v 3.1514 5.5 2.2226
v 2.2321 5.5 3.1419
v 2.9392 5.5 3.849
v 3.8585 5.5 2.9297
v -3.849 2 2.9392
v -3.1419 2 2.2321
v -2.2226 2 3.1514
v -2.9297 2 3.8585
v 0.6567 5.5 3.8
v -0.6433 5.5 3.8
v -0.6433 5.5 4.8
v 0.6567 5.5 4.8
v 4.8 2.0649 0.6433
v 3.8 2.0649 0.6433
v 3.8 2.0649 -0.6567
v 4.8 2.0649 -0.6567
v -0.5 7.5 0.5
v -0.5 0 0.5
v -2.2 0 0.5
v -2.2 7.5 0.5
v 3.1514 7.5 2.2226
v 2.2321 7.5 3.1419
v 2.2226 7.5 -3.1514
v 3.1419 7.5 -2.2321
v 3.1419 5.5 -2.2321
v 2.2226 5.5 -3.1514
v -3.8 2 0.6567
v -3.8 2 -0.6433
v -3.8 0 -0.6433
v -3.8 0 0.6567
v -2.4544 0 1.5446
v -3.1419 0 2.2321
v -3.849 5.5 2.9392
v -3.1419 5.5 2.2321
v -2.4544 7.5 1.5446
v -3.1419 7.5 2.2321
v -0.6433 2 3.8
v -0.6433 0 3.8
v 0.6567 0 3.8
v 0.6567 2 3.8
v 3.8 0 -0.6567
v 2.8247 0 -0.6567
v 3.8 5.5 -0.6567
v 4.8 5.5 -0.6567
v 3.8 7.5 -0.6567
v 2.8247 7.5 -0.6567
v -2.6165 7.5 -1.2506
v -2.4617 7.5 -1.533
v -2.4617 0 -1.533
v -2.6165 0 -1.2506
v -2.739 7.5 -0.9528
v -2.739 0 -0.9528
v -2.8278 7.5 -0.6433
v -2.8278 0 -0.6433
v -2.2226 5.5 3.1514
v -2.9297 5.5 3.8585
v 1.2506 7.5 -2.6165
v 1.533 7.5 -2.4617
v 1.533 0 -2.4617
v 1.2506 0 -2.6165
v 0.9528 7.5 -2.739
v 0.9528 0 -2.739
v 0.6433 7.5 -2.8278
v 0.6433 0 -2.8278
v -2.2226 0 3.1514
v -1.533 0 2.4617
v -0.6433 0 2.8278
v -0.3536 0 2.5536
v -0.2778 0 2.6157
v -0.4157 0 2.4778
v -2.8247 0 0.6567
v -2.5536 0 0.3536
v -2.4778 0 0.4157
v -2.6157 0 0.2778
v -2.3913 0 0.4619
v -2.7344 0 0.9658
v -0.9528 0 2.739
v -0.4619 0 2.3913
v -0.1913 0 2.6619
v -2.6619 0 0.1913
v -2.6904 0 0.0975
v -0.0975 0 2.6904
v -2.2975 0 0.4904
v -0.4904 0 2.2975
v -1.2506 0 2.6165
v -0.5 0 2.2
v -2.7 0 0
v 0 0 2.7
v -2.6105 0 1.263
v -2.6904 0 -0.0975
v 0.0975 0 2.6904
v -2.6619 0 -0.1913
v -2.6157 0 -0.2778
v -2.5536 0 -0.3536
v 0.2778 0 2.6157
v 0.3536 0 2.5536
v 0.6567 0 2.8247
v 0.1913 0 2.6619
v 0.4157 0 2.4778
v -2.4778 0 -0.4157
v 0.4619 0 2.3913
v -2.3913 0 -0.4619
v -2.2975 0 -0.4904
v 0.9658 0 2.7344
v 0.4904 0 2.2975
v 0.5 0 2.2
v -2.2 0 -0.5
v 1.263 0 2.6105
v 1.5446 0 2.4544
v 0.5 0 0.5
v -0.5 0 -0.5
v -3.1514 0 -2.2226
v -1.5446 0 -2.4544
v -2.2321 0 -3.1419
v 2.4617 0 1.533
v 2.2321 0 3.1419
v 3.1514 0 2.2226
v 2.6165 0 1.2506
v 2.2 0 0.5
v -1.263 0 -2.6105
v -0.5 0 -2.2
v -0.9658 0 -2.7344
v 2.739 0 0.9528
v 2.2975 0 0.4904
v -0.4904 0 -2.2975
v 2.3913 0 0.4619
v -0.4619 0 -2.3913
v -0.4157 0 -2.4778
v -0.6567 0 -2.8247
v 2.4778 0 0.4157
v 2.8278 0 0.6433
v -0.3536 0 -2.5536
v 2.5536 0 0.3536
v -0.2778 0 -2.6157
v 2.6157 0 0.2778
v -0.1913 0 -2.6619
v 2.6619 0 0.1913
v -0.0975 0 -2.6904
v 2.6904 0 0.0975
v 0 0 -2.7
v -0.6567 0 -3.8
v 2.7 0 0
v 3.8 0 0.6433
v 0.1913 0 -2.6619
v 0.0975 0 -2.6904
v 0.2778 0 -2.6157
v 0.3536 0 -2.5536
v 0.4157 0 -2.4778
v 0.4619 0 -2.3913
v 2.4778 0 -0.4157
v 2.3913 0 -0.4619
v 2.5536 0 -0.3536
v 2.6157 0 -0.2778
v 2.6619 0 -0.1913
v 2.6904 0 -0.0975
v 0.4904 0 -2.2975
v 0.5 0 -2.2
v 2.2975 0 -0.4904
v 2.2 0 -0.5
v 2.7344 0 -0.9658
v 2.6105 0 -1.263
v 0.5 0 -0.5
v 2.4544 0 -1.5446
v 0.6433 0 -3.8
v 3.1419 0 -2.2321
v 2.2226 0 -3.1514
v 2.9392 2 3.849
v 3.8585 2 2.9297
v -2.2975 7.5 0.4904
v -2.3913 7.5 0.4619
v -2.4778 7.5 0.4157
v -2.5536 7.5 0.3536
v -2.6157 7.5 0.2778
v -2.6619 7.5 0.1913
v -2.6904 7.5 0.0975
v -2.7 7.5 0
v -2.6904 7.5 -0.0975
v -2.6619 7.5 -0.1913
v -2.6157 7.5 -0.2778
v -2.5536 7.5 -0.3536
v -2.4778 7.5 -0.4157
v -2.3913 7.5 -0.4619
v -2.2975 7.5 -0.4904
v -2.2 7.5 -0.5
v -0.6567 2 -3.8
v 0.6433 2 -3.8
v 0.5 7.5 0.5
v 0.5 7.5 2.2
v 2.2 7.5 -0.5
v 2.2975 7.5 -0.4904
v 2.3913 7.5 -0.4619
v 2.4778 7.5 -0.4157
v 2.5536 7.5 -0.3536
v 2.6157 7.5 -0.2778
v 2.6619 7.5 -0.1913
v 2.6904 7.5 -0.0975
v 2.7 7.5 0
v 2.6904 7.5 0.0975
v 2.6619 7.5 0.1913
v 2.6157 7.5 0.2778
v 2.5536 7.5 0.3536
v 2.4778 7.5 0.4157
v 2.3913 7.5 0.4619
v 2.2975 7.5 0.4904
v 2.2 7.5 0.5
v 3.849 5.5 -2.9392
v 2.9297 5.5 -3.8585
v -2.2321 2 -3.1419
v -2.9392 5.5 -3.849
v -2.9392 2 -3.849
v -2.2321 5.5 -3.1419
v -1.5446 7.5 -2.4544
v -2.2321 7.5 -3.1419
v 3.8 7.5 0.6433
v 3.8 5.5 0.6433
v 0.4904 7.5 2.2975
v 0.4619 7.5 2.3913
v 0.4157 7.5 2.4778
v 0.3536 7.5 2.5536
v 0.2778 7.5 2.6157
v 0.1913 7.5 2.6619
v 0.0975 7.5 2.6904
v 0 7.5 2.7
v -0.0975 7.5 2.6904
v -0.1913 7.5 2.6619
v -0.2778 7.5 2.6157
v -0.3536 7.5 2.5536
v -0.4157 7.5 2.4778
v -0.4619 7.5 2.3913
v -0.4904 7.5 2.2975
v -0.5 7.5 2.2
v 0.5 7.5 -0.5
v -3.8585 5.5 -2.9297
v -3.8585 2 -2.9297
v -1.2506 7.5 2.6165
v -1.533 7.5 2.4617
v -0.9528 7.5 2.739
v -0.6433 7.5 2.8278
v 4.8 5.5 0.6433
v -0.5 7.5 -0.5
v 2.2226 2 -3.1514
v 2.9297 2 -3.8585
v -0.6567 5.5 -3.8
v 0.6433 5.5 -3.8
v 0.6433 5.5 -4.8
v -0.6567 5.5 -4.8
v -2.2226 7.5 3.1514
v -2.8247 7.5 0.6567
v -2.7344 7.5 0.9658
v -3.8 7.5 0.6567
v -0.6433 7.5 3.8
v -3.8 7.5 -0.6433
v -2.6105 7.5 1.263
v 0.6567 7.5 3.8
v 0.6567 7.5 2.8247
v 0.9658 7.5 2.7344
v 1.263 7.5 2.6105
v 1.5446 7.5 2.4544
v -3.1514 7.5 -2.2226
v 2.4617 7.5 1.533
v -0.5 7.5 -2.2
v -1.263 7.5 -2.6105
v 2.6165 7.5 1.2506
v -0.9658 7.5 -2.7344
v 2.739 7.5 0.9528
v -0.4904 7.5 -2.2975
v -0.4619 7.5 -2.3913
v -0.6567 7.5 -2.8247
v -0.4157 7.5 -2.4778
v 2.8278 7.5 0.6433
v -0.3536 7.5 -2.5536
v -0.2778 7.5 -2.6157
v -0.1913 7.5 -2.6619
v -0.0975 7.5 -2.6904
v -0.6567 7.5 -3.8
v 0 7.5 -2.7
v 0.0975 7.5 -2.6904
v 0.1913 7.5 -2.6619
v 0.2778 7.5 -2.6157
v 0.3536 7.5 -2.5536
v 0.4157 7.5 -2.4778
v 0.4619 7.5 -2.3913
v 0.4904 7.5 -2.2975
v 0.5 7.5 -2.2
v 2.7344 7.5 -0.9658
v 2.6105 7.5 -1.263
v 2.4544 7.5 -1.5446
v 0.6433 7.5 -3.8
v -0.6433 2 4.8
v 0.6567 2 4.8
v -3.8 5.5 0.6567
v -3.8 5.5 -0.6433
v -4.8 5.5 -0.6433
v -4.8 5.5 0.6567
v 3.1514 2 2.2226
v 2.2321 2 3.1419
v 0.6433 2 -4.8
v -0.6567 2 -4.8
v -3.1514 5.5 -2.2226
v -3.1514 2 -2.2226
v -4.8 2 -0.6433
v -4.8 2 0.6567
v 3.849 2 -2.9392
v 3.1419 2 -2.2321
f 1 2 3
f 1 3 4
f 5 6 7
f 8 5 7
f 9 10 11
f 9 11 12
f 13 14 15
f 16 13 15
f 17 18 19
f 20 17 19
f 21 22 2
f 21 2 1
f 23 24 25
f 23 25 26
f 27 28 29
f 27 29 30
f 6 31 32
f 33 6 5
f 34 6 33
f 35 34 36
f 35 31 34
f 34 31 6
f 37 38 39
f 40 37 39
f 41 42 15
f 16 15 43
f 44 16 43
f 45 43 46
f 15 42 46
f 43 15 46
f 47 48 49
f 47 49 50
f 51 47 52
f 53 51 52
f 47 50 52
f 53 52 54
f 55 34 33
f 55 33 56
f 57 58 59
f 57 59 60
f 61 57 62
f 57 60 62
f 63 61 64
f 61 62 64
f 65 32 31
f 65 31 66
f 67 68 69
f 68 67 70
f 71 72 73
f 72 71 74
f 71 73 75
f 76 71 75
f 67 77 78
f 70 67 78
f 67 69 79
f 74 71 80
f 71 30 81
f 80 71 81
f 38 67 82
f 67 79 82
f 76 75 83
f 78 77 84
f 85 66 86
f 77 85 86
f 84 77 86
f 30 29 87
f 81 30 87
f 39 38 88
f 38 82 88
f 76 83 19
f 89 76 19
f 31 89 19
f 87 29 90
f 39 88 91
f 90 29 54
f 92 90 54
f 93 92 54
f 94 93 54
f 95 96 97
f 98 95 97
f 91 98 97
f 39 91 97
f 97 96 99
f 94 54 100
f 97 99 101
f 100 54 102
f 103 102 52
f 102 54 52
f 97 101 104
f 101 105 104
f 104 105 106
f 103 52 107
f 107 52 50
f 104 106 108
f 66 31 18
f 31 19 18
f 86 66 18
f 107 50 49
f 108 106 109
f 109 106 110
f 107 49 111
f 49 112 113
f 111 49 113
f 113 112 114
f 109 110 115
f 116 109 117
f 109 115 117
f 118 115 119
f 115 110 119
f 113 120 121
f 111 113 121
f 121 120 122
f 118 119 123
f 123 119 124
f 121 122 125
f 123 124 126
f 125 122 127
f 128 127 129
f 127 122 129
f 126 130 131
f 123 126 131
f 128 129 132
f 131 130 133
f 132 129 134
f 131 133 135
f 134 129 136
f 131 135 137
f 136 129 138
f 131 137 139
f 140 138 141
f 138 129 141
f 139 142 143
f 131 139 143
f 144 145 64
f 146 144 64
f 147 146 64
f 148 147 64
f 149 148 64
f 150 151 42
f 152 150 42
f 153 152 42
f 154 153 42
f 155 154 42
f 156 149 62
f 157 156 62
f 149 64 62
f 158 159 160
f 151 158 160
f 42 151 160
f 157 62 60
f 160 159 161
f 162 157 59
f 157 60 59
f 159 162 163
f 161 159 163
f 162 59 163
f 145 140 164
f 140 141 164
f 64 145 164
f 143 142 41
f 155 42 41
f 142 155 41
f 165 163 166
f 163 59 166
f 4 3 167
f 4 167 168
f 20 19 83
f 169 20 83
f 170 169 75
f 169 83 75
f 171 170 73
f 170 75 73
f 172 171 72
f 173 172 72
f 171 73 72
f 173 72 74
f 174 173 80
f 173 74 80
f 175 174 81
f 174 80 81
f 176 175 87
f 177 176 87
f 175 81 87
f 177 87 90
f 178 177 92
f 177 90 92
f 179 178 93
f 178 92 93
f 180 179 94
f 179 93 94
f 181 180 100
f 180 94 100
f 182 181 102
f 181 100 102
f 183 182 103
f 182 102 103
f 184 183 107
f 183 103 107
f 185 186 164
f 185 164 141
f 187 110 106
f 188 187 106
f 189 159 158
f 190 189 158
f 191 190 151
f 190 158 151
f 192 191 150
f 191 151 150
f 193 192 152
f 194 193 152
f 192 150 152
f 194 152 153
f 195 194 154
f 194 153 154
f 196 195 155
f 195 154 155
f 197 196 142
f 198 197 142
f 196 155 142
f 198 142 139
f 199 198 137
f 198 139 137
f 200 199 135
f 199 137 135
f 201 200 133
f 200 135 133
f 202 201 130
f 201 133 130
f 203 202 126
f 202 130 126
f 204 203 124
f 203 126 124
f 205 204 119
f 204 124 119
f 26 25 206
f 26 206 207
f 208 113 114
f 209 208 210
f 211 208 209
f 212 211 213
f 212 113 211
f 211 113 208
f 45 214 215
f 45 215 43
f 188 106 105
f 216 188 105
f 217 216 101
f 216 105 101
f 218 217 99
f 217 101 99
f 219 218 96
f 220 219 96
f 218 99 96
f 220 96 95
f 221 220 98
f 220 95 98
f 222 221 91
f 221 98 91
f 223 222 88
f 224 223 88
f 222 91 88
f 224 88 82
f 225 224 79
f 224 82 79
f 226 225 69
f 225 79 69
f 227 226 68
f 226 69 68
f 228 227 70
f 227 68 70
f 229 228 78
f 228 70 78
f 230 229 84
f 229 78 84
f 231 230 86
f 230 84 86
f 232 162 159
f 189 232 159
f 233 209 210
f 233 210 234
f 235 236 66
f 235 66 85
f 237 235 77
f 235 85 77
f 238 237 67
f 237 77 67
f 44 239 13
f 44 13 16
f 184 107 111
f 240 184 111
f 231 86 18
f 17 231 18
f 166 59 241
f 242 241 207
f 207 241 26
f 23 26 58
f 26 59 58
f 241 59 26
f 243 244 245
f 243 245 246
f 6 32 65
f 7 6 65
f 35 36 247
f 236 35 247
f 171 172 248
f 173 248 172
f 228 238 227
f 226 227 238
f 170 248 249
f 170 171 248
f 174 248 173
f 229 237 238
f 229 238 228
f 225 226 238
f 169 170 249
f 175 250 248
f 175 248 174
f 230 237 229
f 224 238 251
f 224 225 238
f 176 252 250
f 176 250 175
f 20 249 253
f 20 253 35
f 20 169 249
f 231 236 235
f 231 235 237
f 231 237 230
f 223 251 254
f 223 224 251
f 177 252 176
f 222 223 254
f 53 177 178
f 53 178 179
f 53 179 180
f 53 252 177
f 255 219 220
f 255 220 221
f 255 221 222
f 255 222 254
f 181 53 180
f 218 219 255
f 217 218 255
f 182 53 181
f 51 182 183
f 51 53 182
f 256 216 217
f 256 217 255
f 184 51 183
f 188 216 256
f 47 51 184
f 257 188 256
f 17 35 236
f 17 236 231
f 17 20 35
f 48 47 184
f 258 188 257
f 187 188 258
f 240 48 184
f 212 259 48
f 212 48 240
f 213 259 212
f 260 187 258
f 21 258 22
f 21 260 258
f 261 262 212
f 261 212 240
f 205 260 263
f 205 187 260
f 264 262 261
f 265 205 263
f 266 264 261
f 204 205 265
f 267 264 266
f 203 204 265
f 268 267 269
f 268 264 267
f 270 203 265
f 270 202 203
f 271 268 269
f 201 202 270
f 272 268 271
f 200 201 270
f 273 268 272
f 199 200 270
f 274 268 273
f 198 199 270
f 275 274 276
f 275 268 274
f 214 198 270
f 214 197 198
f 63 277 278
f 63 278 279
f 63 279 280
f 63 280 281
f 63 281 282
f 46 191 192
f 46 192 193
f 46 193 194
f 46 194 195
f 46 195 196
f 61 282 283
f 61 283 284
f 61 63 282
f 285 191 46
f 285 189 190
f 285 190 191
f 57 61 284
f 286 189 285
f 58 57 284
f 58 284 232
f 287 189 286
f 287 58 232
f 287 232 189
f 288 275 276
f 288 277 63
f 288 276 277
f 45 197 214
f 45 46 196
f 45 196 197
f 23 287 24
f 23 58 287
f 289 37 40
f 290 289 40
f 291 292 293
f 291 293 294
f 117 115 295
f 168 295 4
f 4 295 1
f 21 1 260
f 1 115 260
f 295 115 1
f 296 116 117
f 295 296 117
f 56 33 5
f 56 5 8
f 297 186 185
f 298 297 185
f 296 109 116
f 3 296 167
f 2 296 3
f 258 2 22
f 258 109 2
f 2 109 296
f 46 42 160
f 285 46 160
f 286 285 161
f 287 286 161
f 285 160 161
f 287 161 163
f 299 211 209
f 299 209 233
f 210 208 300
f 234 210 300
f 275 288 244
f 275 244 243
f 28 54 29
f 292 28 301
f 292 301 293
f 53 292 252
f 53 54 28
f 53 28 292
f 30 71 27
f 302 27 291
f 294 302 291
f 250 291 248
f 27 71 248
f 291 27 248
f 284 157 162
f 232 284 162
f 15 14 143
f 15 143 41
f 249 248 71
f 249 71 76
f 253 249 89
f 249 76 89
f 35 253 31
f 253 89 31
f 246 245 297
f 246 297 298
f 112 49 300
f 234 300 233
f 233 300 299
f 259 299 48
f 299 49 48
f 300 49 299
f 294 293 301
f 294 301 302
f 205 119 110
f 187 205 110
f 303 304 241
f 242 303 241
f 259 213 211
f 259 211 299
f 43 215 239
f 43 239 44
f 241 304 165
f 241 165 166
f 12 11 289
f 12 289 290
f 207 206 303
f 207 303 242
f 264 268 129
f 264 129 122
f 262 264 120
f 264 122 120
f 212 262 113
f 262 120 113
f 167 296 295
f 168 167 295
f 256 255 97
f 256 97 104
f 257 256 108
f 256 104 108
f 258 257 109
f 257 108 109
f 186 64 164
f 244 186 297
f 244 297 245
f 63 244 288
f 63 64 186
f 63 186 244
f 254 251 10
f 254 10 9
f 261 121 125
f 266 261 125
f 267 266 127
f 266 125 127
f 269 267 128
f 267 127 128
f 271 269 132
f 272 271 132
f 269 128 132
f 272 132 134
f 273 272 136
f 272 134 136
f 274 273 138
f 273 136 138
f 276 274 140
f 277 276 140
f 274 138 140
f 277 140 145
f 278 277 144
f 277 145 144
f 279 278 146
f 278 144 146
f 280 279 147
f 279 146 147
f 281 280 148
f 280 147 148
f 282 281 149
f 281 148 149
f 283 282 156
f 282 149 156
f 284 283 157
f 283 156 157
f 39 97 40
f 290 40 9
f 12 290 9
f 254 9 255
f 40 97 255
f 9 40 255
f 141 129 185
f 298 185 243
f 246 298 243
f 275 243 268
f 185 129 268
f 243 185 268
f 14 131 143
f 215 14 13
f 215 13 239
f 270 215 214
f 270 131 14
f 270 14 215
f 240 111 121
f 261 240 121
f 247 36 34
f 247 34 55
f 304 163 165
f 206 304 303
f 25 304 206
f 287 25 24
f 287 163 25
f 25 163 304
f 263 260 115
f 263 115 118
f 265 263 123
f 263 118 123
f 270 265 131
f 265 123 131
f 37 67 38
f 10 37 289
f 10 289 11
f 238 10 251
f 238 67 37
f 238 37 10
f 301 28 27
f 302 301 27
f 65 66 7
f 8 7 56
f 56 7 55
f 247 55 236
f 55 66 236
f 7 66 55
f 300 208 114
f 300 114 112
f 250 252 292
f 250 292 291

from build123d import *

# Parameters (mm, degrees)
SKETCH1_R            = 2.9
BOSS_EXTRUDE1_DEPTH  = 7.5
SKETCH2_W            = 1
SKETCH2_H            = 1
CUT_EXTRUDE1_DEPTH   = 7.5
SKETCH8_W            = 1.3
SKETCH8_H            = 7.5
BOSS_EXTRUDE4_DEPTH  = 1
CIRPATTERN3_COUNT    = 8
SKETCH10_W           = 1.3
SKETCH10_H           = 3.5
BOSS_EXTRUDE6_DEPTH  = 1
SKETCH11_W           = 1.3
SKETCH11_H           = 3.5
BOSS_EXTRUDE7_DEPTH  = 1
SKETCH12_W           = 1.3
SKETCH12_H           = 3.5
BOSS_EXTRUDE8_DEPTH  = 1
SKETCH14_W           = 1.3
SKETCH14_H           = 3.5
BOSS_EXTRUDE9_DEPTH  = 1
SKETCH15_W           = 1.3
SKETCH15_H           = 3.5
BOSS_EXTRUDE10_DEPTH = 1
SKETCH16_W           = 1.3
SKETCH16_H           = 3.5
BOSS_EXTRUDE11_DEPTH = 1
SKETCH17_W           = 1.3
SKETCH17_H           = 3.43512081
BOSS_EXTRUDE12_DEPTH = 1
SKETCH18_W           = 1.3
SKETCH18_H           = 3.5
BOSS_EXTRUDE13_DEPTH = 1


with BuildPart() as part:
    # Sketch1 → Boss-Extrude1 (new body)
    with BuildSketch(Plane(origin=(0, 0, 0), x_dir=(1, 0, 0), z_dir=(0, 1, 0))):
        Circle(SKETCH1_R)
    extrude(amount=BOSS_EXTRUDE1_DEPTH)

    # Sketch2 → Cut-Extrude1 (cut)
    with BuildSketch(Plane.XZ):
        with BuildLine():
            Line((0.5, 0.5), (0.5, 2.2))
            ThreePointArc((0.5, 2.2), (0, 2.7), (-0.5, 2.2))
            Line((-0.5, 2.2), (-0.5, 0.5))
            Line((-0.5, 0.5), (0.5, 0.5))
        make_face()
        Rectangle(SKETCH2_W, SKETCH2_H)
        with BuildLine():
            Line((0.5, -2.2), (0.5, -0.5))
            Line((0.5, -0.5), (-0.5, -0.5))
            Line((-0.5, -0.5), (-0.5, -2.2))
            ThreePointArc((-0.5, -2.2), (0, -2.7), (0.5, -2.2))
        make_face()
        with BuildLine():
            Line((2.2, 0.5), (0.5, 0.5))
            Line((0.5, 0.5), (0.5, -0.5))
            Line((0.5, -0.5), (2.2, -0.5))
            ThreePointArc((2.2, -0.5), (2.7, 0), (2.2, 0.5))
        make_face()
        with BuildLine():
            Line((-0.5, -0.5), (-0.5, 0.5))
            Line((-0.5, 0.5), (-2.2, 0.5))
            ThreePointArc((-2.2, 0.5), (-2.7, 0), (-2.2, -0.5))
            Line((-2.2, -0.5), (-0.5, -0.5))
        make_face()
    extrude(amount=-CUT_EXTRUDE1_DEPTH, mode=Mode.SUBTRACT)

    # Sketch8 → Boss-Extrude4 (add)
    with BuildSketch(Plane(origin=(2.8, 0, 0), x_dir=(0, 0, -1), z_dir=(1, 0, 0))):
        with Locations((0.006709133, 3.75)):
            Rectangle(SKETCH8_W, SKETCH8_H)
    boss_extrude4 = extrude(amount=BOSS_EXTRUDE4_DEPTH)

    # CirPattern3: Boss-Extrude4 ×8 about axis
    cirpattern3_axis = Axis((0, 0, 0), (0, 1, 0))
    for i in range(1, CIRPATTERN3_COUNT):
        add(boss_extrude4.rotate(cirpattern3_axis, i * 360 / CIRPATTERN3_COUNT))

    # Sketch10 → Boss-Extrude6 (add)
    with BuildSketch(Plane(origin=(0, 0, -3.8), x_dir=(-1, 0, 0), z_dir=(0, 0, -1))):
        with Locations((0.006709133, 3.75)):
            Rectangle(SKETCH10_W, SKETCH10_H)
    extrude(amount=BOSS_EXTRUDE6_DEPTH)

    # Sketch11 → Boss-Extrude7 (add)
    with BuildSketch(Plane(origin=(-2.687005769, 0, -2.687005769), x_dir=(-0.707106781, 0, 0.707106781), z_dir=(-0.707106781, 0, -0.707106781))):
        with Locations((0.006709133, 3.75)):
            Rectangle(SKETCH11_W, SKETCH11_H)
    extrude(amount=BOSS_EXTRUDE7_DEPTH)

    # Sketch12 → Boss-Extrude8 (add)
    with BuildSketch(Plane.ZY.offset(3.8)):
        with Locations((0.006709133, 3.75)):
            Rectangle(SKETCH12_W, SKETCH12_H)
    extrude(amount=BOSS_EXTRUDE8_DEPTH)

    # Sketch14 → Boss-Extrude9 (add)
    with BuildSketch(Plane(origin=(-2.687005769, 0, 2.687005769), x_dir=(0.707106781, 0, 0.707106781), z_dir=(-0.707106781, 0, 0.707106781))):
        with Locations((0.006709133, 3.75)):
            Rectangle(SKETCH14_W, SKETCH14_H)
    extrude(amount=BOSS_EXTRUDE9_DEPTH)

    # Sketch15 → Boss-Extrude10 (add)
    with BuildSketch(Plane.XY.offset(3.8)):
        with Locations((0.006709133, 3.75)):
            Rectangle(SKETCH15_W, SKETCH15_H)
    extrude(amount=BOSS_EXTRUDE10_DEPTH)

    # Sketch16 → Boss-Extrude11 (add)
    with BuildSketch(Plane(origin=(2.687005769, 0, 2.687005769), x_dir=(0.707106781, 0, -0.707106781), z_dir=(0.707106781, 0, 0.707106781))):
        with Locations((0.006709133, 3.75)):
            Rectangle(SKETCH16_W, SKETCH16_H)
    extrude(amount=BOSS_EXTRUDE11_DEPTH)

    # Sketch17 → Boss-Extrude12 (add)
    with BuildSketch(Plane(origin=(3.8, 0, 0), x_dir=(0, 0, -1), z_dir=(1, 0, 0))):
        with Locations((0.006709133, 3.782439595)):
            Rectangle(SKETCH17_W, SKETCH17_H)
    extrude(amount=BOSS_EXTRUDE12_DEPTH)

    # Sketch18 → Boss-Extrude13 (add)
    with BuildSketch(Plane(origin=(2.687005769, 0, -2.687005769), x_dir=(-0.707106781, 0, -0.707106781), z_dir=(0.707106781, 0, -0.707106781))):
        with Locations((0.006709133, 3.75)):
            Rectangle(SKETCH18_W, SKETCH18_H)
    extrude(amount=BOSS_EXTRUDE13_DEPTH)


solid = part.part
